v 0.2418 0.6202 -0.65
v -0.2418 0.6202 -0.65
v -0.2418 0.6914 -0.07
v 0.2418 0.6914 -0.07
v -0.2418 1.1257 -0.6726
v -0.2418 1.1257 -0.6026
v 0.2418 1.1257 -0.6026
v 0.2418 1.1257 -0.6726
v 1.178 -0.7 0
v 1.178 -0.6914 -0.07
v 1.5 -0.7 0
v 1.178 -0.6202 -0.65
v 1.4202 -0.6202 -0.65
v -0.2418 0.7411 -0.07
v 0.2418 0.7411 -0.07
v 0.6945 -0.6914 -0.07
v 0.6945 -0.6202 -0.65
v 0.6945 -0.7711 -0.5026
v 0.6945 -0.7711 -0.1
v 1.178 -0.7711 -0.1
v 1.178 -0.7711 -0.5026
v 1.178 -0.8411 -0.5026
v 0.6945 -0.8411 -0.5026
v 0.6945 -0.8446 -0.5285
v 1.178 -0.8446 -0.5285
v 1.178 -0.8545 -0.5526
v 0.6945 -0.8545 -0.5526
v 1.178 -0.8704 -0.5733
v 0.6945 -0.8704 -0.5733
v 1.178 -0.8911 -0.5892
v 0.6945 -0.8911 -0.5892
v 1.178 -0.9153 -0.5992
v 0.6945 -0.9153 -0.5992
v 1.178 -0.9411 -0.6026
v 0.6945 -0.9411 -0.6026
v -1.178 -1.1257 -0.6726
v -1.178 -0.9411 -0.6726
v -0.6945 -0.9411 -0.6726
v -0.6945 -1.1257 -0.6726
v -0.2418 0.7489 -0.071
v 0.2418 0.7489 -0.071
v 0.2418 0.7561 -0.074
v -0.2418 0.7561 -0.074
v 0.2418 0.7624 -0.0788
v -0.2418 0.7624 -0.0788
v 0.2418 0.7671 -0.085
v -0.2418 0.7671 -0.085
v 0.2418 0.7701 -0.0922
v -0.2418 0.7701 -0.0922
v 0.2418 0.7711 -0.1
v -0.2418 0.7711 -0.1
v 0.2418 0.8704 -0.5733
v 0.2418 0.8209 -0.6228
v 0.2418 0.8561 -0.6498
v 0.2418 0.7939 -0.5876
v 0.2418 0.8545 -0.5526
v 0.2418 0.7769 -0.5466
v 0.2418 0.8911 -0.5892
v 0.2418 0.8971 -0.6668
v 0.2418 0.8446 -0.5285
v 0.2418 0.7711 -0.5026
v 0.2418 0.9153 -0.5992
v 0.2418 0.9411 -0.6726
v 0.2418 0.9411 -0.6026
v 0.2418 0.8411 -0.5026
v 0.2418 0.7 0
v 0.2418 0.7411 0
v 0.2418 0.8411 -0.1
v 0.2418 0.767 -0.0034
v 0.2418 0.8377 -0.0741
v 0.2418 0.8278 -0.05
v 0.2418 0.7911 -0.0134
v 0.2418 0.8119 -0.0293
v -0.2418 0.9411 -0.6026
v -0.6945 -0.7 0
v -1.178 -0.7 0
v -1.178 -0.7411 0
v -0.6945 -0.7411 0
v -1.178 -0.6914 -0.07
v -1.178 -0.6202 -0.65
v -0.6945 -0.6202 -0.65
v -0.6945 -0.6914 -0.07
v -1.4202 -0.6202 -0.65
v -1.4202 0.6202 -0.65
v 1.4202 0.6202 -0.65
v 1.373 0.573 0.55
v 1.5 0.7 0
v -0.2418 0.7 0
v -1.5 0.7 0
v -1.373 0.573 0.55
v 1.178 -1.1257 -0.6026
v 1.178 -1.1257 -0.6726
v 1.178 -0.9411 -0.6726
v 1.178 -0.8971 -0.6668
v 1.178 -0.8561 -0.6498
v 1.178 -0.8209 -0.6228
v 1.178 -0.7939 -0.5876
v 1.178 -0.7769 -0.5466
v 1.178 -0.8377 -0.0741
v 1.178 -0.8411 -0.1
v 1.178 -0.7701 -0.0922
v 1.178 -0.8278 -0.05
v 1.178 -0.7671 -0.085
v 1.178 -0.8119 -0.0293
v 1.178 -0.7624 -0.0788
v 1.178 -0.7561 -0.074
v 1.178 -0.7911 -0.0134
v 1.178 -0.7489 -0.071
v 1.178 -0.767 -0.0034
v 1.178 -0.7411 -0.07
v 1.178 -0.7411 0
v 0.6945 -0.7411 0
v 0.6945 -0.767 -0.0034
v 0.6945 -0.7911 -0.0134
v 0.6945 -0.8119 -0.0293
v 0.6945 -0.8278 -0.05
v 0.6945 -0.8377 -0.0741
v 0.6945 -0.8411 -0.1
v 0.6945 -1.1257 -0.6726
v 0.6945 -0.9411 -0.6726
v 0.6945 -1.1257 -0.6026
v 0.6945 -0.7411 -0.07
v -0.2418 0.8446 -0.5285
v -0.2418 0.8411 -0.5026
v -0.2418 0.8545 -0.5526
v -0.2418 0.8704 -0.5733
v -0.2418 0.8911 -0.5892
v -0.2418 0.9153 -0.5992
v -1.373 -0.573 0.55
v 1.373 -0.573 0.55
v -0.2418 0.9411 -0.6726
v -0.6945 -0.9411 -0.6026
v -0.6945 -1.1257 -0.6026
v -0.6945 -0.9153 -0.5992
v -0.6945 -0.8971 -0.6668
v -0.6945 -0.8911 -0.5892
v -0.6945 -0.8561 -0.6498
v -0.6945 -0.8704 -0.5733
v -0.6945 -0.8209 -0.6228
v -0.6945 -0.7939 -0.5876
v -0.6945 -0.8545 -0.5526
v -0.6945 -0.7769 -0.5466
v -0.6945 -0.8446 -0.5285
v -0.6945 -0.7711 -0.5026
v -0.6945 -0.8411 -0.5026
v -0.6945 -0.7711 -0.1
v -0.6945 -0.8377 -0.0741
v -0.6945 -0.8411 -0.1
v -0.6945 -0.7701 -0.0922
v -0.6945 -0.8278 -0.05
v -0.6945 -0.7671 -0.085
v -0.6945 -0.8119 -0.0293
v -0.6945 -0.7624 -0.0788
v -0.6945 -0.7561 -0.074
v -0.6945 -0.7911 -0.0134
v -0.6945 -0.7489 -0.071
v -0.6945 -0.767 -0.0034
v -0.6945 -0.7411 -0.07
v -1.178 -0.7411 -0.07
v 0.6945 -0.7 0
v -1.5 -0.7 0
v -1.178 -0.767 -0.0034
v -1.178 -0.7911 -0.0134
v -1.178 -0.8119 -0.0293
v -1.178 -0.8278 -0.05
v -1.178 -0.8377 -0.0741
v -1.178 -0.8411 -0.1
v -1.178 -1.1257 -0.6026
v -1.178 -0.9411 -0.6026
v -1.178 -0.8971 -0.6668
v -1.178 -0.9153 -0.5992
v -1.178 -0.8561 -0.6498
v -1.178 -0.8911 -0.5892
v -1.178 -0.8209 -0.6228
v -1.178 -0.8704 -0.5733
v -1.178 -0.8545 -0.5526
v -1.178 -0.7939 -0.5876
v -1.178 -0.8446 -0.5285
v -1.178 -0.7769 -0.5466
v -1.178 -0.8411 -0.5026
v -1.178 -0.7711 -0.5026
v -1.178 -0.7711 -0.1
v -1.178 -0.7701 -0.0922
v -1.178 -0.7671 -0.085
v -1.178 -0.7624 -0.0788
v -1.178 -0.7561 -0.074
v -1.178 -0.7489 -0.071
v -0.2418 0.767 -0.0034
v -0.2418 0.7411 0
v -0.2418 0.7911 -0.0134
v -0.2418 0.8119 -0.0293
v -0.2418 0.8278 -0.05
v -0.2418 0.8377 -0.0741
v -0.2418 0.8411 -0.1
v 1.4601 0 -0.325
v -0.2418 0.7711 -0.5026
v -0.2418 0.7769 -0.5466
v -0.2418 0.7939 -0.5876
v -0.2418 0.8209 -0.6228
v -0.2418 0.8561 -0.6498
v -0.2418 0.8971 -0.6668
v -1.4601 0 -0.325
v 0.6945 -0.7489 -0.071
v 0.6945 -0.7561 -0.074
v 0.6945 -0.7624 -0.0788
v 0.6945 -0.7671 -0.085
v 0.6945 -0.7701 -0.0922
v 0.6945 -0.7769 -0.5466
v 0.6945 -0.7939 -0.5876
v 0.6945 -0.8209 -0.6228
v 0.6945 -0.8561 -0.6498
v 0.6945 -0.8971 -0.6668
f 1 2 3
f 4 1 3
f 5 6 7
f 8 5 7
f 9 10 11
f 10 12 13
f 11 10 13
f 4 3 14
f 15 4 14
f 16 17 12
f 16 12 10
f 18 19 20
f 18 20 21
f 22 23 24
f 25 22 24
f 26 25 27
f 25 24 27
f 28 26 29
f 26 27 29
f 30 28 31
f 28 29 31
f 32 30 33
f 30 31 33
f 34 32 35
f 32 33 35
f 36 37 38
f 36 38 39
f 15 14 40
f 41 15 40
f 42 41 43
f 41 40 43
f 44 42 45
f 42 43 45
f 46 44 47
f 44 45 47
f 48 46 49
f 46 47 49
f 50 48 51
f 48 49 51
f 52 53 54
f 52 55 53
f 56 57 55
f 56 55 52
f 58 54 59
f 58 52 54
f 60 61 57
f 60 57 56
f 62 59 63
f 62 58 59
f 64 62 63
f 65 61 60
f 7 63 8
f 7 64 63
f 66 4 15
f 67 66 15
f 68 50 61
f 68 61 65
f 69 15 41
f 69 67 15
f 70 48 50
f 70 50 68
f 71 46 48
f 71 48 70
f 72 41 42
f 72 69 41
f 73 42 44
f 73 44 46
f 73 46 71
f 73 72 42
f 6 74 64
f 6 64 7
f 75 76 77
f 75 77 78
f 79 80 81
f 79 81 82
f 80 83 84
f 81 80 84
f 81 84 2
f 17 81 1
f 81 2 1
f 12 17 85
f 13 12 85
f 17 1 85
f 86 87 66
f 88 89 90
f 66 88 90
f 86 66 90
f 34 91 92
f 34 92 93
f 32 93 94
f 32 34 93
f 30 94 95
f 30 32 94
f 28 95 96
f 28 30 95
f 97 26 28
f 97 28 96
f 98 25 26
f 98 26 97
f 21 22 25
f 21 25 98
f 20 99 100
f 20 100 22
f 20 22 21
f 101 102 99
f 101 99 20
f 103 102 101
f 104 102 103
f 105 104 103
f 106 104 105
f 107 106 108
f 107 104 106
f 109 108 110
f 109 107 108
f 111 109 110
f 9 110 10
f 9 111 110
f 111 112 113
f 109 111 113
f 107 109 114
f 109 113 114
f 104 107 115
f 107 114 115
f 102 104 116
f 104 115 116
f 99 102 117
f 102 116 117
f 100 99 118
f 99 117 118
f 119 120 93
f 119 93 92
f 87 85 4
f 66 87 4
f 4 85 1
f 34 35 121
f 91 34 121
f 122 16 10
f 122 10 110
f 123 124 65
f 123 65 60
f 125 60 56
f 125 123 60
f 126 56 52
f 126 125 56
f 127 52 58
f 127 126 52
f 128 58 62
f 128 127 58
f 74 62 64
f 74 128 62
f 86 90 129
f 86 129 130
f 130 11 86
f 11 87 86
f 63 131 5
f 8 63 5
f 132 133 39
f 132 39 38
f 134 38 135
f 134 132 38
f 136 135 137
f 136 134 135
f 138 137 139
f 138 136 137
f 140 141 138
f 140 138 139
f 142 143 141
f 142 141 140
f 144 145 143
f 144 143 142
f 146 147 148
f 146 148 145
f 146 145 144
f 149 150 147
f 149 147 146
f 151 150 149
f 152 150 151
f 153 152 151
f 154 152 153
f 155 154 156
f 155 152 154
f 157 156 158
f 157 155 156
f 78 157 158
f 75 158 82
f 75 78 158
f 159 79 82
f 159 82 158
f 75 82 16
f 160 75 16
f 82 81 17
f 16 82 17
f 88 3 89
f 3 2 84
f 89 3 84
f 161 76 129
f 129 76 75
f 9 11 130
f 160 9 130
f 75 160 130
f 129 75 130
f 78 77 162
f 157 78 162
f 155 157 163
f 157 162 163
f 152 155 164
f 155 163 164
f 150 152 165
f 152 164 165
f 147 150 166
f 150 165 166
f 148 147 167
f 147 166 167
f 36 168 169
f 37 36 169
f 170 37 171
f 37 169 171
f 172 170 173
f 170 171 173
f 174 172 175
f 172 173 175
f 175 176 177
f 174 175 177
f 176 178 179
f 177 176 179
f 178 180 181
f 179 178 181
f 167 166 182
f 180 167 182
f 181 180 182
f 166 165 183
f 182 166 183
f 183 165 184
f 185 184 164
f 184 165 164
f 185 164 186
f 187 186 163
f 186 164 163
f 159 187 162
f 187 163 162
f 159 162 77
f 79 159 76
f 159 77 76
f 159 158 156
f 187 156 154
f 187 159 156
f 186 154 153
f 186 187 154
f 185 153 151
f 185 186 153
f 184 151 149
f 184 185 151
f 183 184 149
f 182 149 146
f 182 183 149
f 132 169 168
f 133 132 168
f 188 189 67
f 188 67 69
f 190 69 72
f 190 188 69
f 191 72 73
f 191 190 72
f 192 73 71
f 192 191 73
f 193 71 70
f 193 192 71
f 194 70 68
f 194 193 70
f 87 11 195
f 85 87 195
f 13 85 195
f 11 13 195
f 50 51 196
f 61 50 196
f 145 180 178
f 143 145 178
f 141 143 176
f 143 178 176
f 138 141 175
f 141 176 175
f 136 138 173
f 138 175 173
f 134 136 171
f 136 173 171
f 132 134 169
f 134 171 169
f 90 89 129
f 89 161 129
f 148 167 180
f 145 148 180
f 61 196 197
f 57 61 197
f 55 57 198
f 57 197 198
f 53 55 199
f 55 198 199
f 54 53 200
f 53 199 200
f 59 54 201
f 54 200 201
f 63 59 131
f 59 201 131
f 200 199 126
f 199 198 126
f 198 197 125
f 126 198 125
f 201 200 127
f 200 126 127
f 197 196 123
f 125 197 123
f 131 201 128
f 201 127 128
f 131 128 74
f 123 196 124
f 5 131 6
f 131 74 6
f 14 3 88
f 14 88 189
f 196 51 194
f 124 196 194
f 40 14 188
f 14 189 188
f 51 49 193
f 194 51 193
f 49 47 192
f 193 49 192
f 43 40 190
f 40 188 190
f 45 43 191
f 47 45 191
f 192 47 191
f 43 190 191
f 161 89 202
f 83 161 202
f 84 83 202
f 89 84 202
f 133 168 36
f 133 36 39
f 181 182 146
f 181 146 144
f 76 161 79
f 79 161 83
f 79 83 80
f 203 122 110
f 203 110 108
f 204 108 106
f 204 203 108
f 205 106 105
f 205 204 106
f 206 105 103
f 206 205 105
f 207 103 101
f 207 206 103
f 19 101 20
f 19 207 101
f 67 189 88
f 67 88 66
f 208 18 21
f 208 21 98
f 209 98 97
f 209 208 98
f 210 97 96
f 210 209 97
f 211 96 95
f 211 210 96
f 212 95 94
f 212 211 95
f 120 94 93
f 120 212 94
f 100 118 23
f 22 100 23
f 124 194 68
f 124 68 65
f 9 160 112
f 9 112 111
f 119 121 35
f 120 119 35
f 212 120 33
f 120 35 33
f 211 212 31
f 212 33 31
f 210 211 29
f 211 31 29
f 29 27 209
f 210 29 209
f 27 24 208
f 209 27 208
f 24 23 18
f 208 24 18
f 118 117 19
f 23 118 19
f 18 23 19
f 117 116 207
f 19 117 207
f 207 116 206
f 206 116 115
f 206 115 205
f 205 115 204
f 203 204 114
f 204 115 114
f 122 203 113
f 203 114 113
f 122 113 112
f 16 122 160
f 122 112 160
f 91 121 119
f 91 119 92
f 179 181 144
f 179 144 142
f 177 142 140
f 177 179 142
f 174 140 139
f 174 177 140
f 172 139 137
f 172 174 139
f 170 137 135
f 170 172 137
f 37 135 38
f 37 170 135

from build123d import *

# Parameters (mm, degrees)
CROQUIS1_W                        = 3
CROQUIS1_H                        = 1.4
SALIENTE_EXTRUIR1_DEPTH           = 0.55
SALIENTE_EXTRUIR1_TAPER           = 13
SALIENTE_EXTRUIR1_OTHER_WAY_DEPTH = 0.65
SALIENTE_EXTRUIR1_OTHER_WAY_TAPER = 7
CROQUIS5_W                        = 0.48350588
CROQUIS5_H                        = 0.55271101
SALIENTE_EXTRUIR5_DEPTH           = 0.69
CORTAR_EXTRUIR2_DEPTH             = 2.69


with BuildPart() as part:
    # Croquis1 → Saliente-Extruir1 (new body)
    with BuildSketch(Plane.XY):
        Rectangle(CROQUIS1_W, CROQUIS1_H)
    extrude(amount=SALIENTE_EXTRUIR1_DEPTH, taper=SALIENTE_EXTRUIR1_TAPER)

    # Croquis1 → Saliente-Extruir1 other way (add)
    with BuildSketch(Plane.XY):
        Rectangle(CROQUIS1_W, CROQUIS1_H)
    extrude(amount=-SALIENTE_EXTRUIR1_OTHER_WAY_DEPTH, taper=SALIENTE_EXTRUIR1_OTHER_WAY_TAPER)

    # Croquis5 → Saliente-Extruir5 (add)
    with BuildSketch(Plane.XY):
        with Locations((-0.936243204, -0.849378)):
            Rectangle(CROQUIS5_W, CROQUIS5_H)
        with Locations((0.936243204, -0.849378)):
            Rectangle(CROQUIS5_W, CROQUIS5_H)
        with Locations((0, 0.849378)):
            Rectangle(CROQUIS5_W, CROQUIS5_H)
    extrude(amount=-SALIENTE_EXTRUIR5_DEPTH)

    # Croquis7 → Cortar-Extruir2 (cut)
    with BuildSketch(Plane.ZY.offset(1.177996144)):
        with BuildLine():
            Line((-0.602582914, -1.125733505), (0, -1.125733505))
            Line((0, -1.125733505), (0, -0.741148346))
            ThreePointArc((0, -0.741148346), (-0.029289322, -0.811859024), (-0.1, -0.841148346))
            Line((-0.1, -0.841148346), (-0.502582914, -0.841148346))
            ThreePointArc((-0.502582914, -0.841148346), (-0.573293592, -0.870437668), (-0.602582914, -0.941148346))
            Line((-0.602582914, -0.941148346), (-0.602582914, -1.125733505))
        make_face()
        with BuildLine():
            Line((-0.07, -0.691405081), (-0.07, -0.741148346))
            ThreePointArc((-0.07, -0.741148346), (-0.078786797, -0.762361549), (-0.1, -0.771148346))
            Line((-0.1, -0.771148346), (-0.502582914, -0.771148346))
            ThreePointArc((-0.502582914, -0.771148346), (-0.622791067, -0.820940193), (-0.672582914, -0.941148346))
            Line((-0.672582914, -0.941148346), (-0.672582914, -1.125733505))
            Line((-0.672582914, -1.125733505), (-0.69, -1.125733505))
            Line((-0.69, -1.125733505), (-0.69, -0.573022495))
            Line((-0.69, -0.573022495), (-0.65, -0.573022495))
            Line((-0.65, -0.573022495), (-0.65, -0.620190035))
            Line((-0.65, -0.620190035), (-0.07, -0.691405081))
        make_face()
        with BuildLine():
            Line((-0.672582914, 0.941148346), (-0.672582914, 1.125733505))
            Line((-0.672582914, 1.125733505), (-0.69, 1.125733505))
            Line((-0.69, 1.125733505), (-0.69, 0.573022495))
            Line((-0.69, 0.573022495), (-0.65, 0.573022495))
            Line((-0.65, 0.573022495), (-0.65, 0.620190035))
            Line((-0.65, 0.620190035), (-0.07, 0.691405081))
            Line((-0.07, 0.691405081), (-0.07, 0.741148346))
            ThreePointArc((-0.07, 0.741148346), (-0.078786797, 0.762361549), (-0.1, 0.771148346))
            Line((-0.1, 0.771148346), (-0.502582914, 0.771148346))
            ThreePointArc((-0.502582914, 0.771148346), (-0.622791067, 0.820940193), (-0.672582914, 0.941148346))
        make_face()
        with BuildLine():
            Line((0, 1.125733505), (0, 0.741148346))
            ThreePointArc((0, 0.741148346), (-0.029289322, 0.811859024), (-0.1, 0.841148346))
            Line((-0.1, 0.841148346), (-0.502582914, 0.841148346))
            ThreePointArc((-0.502582914, 0.841148346), (-0.573293592, 0.870437668), (-0.602582914, 0.941148346))
            Line((-0.602582914, 0.941148346), (-0.602582914, 1.125733505))
            Line((-0.602582914, 1.125733505), (0, 1.125733505))
        make_face()
    extrude(amount=-CORTAR_EXTRUIR2_DEPTH, mode=Mode.SUBTRACT)


solid = part.part
